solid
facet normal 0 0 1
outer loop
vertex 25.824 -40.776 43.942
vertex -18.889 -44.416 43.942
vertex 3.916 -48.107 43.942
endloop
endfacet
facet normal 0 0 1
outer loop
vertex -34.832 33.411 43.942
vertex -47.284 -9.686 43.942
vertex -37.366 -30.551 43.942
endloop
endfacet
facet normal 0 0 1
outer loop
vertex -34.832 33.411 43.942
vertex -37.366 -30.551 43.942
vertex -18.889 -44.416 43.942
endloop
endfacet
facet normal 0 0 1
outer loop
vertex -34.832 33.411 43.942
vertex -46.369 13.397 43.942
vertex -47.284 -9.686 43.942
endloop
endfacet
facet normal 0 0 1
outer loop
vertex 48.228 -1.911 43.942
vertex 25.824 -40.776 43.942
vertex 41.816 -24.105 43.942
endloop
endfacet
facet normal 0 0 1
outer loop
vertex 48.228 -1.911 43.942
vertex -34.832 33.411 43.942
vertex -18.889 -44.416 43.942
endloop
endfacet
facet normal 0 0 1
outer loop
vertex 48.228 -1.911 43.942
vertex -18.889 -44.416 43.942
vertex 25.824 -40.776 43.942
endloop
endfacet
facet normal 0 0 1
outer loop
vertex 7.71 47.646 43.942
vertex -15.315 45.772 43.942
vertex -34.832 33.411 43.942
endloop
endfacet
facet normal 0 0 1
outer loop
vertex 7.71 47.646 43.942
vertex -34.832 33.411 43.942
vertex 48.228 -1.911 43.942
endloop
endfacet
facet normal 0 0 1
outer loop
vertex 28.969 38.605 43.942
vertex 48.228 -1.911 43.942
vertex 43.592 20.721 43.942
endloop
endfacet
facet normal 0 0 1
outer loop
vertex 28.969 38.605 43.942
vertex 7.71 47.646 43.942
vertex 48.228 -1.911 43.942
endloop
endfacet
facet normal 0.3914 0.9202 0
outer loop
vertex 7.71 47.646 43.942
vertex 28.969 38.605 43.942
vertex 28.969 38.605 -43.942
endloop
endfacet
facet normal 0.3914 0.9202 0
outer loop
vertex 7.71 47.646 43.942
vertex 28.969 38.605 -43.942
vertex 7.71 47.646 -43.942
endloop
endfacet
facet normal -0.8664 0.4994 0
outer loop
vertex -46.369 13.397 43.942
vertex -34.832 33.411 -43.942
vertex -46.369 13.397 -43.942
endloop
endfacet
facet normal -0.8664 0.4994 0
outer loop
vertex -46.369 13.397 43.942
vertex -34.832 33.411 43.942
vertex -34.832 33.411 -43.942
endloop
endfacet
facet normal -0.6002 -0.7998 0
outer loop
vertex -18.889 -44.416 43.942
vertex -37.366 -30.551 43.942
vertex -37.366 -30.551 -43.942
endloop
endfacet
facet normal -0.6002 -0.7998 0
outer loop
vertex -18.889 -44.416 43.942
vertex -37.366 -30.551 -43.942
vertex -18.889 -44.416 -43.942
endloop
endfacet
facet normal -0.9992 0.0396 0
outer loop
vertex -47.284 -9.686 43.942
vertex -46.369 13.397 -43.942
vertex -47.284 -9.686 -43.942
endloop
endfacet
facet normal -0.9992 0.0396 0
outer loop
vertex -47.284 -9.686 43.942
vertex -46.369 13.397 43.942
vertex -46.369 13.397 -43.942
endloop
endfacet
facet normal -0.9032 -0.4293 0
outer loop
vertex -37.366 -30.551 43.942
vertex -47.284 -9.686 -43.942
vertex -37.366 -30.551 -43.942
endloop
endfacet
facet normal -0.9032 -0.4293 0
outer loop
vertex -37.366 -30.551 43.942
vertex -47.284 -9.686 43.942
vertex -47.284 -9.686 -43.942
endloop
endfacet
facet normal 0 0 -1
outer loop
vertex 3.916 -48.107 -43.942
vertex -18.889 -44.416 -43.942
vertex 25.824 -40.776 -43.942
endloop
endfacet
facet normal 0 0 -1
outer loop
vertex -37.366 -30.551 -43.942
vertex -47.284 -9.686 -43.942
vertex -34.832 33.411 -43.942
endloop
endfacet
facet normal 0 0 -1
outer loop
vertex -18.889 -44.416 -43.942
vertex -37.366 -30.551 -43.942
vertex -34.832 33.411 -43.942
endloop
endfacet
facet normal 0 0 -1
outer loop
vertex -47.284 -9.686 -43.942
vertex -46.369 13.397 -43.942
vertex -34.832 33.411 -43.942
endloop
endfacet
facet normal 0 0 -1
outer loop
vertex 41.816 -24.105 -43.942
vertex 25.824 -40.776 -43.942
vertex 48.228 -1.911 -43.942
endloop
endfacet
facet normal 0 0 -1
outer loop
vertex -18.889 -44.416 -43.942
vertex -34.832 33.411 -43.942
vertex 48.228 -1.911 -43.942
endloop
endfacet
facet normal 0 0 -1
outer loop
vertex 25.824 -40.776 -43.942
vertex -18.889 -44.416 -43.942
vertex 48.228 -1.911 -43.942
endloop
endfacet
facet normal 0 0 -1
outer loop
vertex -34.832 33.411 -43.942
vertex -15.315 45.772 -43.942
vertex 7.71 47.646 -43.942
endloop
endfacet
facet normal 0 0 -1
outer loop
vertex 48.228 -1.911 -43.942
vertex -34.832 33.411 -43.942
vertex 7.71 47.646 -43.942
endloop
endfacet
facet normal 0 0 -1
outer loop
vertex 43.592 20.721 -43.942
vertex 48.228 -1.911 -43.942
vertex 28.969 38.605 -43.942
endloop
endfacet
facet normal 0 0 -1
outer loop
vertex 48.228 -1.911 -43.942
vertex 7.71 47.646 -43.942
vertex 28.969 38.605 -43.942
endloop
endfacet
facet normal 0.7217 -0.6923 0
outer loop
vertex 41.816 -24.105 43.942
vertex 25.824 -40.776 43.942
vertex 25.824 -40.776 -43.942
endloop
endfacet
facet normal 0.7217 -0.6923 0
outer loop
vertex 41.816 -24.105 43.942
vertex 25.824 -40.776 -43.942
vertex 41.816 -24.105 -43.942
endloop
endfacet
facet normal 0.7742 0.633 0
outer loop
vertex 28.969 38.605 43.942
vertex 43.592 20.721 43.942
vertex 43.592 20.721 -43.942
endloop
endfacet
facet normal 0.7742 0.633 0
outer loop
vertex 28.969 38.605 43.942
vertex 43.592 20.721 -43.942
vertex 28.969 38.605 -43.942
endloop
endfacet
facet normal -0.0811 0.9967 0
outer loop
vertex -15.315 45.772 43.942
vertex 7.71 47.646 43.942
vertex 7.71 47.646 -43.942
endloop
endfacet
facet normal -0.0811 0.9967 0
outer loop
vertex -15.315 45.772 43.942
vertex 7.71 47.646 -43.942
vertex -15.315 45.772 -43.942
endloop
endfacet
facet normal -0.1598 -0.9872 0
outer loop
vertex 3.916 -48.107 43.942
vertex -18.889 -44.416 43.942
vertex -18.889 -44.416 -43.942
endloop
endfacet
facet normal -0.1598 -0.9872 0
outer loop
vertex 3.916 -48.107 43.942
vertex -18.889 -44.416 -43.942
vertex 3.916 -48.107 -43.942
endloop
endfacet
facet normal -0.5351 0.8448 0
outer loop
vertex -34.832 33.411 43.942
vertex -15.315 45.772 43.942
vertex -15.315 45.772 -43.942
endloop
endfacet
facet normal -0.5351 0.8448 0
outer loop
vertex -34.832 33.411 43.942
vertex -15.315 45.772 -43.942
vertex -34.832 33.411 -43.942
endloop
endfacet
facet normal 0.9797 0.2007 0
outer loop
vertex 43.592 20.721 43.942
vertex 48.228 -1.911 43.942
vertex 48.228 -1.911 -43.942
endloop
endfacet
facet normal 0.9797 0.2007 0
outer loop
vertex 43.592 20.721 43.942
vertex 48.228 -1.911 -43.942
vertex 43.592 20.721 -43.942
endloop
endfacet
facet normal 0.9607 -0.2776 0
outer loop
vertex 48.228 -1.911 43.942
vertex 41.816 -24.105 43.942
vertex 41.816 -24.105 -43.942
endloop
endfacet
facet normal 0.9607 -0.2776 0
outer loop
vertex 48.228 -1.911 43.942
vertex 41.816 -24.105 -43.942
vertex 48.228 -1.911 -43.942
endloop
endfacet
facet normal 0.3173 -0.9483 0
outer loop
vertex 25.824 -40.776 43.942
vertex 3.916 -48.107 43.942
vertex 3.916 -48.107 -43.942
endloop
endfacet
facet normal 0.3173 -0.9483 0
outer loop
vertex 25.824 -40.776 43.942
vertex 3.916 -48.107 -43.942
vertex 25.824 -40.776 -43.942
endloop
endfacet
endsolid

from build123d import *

# Parameters (mm, degrees)
F1_DEPTH = 43.942


with BuildPart() as f1:
    # F0 (on Top) → F1 (new body, symmetric)
    with BuildSketch(Plane.XY):
        Polygon((-47.283915, -9.686464), (-37.366303, -30.550869), (-18.888521, -44.416438), (3.916393, -48.106737), (25.824109, -40.776361), (41.815833, -24.104613), (48.228053, -1.910788), (43.591808, 20.720775), (28.969205, 38.605458), (7.710106, 47.646096), (-15.315285, 45.771588), (-34.832129, 33.41136), (-46.369352, 13.396993), align=None)
    extrude(amount=F1_DEPTH, both=True)


solid = f1.part
